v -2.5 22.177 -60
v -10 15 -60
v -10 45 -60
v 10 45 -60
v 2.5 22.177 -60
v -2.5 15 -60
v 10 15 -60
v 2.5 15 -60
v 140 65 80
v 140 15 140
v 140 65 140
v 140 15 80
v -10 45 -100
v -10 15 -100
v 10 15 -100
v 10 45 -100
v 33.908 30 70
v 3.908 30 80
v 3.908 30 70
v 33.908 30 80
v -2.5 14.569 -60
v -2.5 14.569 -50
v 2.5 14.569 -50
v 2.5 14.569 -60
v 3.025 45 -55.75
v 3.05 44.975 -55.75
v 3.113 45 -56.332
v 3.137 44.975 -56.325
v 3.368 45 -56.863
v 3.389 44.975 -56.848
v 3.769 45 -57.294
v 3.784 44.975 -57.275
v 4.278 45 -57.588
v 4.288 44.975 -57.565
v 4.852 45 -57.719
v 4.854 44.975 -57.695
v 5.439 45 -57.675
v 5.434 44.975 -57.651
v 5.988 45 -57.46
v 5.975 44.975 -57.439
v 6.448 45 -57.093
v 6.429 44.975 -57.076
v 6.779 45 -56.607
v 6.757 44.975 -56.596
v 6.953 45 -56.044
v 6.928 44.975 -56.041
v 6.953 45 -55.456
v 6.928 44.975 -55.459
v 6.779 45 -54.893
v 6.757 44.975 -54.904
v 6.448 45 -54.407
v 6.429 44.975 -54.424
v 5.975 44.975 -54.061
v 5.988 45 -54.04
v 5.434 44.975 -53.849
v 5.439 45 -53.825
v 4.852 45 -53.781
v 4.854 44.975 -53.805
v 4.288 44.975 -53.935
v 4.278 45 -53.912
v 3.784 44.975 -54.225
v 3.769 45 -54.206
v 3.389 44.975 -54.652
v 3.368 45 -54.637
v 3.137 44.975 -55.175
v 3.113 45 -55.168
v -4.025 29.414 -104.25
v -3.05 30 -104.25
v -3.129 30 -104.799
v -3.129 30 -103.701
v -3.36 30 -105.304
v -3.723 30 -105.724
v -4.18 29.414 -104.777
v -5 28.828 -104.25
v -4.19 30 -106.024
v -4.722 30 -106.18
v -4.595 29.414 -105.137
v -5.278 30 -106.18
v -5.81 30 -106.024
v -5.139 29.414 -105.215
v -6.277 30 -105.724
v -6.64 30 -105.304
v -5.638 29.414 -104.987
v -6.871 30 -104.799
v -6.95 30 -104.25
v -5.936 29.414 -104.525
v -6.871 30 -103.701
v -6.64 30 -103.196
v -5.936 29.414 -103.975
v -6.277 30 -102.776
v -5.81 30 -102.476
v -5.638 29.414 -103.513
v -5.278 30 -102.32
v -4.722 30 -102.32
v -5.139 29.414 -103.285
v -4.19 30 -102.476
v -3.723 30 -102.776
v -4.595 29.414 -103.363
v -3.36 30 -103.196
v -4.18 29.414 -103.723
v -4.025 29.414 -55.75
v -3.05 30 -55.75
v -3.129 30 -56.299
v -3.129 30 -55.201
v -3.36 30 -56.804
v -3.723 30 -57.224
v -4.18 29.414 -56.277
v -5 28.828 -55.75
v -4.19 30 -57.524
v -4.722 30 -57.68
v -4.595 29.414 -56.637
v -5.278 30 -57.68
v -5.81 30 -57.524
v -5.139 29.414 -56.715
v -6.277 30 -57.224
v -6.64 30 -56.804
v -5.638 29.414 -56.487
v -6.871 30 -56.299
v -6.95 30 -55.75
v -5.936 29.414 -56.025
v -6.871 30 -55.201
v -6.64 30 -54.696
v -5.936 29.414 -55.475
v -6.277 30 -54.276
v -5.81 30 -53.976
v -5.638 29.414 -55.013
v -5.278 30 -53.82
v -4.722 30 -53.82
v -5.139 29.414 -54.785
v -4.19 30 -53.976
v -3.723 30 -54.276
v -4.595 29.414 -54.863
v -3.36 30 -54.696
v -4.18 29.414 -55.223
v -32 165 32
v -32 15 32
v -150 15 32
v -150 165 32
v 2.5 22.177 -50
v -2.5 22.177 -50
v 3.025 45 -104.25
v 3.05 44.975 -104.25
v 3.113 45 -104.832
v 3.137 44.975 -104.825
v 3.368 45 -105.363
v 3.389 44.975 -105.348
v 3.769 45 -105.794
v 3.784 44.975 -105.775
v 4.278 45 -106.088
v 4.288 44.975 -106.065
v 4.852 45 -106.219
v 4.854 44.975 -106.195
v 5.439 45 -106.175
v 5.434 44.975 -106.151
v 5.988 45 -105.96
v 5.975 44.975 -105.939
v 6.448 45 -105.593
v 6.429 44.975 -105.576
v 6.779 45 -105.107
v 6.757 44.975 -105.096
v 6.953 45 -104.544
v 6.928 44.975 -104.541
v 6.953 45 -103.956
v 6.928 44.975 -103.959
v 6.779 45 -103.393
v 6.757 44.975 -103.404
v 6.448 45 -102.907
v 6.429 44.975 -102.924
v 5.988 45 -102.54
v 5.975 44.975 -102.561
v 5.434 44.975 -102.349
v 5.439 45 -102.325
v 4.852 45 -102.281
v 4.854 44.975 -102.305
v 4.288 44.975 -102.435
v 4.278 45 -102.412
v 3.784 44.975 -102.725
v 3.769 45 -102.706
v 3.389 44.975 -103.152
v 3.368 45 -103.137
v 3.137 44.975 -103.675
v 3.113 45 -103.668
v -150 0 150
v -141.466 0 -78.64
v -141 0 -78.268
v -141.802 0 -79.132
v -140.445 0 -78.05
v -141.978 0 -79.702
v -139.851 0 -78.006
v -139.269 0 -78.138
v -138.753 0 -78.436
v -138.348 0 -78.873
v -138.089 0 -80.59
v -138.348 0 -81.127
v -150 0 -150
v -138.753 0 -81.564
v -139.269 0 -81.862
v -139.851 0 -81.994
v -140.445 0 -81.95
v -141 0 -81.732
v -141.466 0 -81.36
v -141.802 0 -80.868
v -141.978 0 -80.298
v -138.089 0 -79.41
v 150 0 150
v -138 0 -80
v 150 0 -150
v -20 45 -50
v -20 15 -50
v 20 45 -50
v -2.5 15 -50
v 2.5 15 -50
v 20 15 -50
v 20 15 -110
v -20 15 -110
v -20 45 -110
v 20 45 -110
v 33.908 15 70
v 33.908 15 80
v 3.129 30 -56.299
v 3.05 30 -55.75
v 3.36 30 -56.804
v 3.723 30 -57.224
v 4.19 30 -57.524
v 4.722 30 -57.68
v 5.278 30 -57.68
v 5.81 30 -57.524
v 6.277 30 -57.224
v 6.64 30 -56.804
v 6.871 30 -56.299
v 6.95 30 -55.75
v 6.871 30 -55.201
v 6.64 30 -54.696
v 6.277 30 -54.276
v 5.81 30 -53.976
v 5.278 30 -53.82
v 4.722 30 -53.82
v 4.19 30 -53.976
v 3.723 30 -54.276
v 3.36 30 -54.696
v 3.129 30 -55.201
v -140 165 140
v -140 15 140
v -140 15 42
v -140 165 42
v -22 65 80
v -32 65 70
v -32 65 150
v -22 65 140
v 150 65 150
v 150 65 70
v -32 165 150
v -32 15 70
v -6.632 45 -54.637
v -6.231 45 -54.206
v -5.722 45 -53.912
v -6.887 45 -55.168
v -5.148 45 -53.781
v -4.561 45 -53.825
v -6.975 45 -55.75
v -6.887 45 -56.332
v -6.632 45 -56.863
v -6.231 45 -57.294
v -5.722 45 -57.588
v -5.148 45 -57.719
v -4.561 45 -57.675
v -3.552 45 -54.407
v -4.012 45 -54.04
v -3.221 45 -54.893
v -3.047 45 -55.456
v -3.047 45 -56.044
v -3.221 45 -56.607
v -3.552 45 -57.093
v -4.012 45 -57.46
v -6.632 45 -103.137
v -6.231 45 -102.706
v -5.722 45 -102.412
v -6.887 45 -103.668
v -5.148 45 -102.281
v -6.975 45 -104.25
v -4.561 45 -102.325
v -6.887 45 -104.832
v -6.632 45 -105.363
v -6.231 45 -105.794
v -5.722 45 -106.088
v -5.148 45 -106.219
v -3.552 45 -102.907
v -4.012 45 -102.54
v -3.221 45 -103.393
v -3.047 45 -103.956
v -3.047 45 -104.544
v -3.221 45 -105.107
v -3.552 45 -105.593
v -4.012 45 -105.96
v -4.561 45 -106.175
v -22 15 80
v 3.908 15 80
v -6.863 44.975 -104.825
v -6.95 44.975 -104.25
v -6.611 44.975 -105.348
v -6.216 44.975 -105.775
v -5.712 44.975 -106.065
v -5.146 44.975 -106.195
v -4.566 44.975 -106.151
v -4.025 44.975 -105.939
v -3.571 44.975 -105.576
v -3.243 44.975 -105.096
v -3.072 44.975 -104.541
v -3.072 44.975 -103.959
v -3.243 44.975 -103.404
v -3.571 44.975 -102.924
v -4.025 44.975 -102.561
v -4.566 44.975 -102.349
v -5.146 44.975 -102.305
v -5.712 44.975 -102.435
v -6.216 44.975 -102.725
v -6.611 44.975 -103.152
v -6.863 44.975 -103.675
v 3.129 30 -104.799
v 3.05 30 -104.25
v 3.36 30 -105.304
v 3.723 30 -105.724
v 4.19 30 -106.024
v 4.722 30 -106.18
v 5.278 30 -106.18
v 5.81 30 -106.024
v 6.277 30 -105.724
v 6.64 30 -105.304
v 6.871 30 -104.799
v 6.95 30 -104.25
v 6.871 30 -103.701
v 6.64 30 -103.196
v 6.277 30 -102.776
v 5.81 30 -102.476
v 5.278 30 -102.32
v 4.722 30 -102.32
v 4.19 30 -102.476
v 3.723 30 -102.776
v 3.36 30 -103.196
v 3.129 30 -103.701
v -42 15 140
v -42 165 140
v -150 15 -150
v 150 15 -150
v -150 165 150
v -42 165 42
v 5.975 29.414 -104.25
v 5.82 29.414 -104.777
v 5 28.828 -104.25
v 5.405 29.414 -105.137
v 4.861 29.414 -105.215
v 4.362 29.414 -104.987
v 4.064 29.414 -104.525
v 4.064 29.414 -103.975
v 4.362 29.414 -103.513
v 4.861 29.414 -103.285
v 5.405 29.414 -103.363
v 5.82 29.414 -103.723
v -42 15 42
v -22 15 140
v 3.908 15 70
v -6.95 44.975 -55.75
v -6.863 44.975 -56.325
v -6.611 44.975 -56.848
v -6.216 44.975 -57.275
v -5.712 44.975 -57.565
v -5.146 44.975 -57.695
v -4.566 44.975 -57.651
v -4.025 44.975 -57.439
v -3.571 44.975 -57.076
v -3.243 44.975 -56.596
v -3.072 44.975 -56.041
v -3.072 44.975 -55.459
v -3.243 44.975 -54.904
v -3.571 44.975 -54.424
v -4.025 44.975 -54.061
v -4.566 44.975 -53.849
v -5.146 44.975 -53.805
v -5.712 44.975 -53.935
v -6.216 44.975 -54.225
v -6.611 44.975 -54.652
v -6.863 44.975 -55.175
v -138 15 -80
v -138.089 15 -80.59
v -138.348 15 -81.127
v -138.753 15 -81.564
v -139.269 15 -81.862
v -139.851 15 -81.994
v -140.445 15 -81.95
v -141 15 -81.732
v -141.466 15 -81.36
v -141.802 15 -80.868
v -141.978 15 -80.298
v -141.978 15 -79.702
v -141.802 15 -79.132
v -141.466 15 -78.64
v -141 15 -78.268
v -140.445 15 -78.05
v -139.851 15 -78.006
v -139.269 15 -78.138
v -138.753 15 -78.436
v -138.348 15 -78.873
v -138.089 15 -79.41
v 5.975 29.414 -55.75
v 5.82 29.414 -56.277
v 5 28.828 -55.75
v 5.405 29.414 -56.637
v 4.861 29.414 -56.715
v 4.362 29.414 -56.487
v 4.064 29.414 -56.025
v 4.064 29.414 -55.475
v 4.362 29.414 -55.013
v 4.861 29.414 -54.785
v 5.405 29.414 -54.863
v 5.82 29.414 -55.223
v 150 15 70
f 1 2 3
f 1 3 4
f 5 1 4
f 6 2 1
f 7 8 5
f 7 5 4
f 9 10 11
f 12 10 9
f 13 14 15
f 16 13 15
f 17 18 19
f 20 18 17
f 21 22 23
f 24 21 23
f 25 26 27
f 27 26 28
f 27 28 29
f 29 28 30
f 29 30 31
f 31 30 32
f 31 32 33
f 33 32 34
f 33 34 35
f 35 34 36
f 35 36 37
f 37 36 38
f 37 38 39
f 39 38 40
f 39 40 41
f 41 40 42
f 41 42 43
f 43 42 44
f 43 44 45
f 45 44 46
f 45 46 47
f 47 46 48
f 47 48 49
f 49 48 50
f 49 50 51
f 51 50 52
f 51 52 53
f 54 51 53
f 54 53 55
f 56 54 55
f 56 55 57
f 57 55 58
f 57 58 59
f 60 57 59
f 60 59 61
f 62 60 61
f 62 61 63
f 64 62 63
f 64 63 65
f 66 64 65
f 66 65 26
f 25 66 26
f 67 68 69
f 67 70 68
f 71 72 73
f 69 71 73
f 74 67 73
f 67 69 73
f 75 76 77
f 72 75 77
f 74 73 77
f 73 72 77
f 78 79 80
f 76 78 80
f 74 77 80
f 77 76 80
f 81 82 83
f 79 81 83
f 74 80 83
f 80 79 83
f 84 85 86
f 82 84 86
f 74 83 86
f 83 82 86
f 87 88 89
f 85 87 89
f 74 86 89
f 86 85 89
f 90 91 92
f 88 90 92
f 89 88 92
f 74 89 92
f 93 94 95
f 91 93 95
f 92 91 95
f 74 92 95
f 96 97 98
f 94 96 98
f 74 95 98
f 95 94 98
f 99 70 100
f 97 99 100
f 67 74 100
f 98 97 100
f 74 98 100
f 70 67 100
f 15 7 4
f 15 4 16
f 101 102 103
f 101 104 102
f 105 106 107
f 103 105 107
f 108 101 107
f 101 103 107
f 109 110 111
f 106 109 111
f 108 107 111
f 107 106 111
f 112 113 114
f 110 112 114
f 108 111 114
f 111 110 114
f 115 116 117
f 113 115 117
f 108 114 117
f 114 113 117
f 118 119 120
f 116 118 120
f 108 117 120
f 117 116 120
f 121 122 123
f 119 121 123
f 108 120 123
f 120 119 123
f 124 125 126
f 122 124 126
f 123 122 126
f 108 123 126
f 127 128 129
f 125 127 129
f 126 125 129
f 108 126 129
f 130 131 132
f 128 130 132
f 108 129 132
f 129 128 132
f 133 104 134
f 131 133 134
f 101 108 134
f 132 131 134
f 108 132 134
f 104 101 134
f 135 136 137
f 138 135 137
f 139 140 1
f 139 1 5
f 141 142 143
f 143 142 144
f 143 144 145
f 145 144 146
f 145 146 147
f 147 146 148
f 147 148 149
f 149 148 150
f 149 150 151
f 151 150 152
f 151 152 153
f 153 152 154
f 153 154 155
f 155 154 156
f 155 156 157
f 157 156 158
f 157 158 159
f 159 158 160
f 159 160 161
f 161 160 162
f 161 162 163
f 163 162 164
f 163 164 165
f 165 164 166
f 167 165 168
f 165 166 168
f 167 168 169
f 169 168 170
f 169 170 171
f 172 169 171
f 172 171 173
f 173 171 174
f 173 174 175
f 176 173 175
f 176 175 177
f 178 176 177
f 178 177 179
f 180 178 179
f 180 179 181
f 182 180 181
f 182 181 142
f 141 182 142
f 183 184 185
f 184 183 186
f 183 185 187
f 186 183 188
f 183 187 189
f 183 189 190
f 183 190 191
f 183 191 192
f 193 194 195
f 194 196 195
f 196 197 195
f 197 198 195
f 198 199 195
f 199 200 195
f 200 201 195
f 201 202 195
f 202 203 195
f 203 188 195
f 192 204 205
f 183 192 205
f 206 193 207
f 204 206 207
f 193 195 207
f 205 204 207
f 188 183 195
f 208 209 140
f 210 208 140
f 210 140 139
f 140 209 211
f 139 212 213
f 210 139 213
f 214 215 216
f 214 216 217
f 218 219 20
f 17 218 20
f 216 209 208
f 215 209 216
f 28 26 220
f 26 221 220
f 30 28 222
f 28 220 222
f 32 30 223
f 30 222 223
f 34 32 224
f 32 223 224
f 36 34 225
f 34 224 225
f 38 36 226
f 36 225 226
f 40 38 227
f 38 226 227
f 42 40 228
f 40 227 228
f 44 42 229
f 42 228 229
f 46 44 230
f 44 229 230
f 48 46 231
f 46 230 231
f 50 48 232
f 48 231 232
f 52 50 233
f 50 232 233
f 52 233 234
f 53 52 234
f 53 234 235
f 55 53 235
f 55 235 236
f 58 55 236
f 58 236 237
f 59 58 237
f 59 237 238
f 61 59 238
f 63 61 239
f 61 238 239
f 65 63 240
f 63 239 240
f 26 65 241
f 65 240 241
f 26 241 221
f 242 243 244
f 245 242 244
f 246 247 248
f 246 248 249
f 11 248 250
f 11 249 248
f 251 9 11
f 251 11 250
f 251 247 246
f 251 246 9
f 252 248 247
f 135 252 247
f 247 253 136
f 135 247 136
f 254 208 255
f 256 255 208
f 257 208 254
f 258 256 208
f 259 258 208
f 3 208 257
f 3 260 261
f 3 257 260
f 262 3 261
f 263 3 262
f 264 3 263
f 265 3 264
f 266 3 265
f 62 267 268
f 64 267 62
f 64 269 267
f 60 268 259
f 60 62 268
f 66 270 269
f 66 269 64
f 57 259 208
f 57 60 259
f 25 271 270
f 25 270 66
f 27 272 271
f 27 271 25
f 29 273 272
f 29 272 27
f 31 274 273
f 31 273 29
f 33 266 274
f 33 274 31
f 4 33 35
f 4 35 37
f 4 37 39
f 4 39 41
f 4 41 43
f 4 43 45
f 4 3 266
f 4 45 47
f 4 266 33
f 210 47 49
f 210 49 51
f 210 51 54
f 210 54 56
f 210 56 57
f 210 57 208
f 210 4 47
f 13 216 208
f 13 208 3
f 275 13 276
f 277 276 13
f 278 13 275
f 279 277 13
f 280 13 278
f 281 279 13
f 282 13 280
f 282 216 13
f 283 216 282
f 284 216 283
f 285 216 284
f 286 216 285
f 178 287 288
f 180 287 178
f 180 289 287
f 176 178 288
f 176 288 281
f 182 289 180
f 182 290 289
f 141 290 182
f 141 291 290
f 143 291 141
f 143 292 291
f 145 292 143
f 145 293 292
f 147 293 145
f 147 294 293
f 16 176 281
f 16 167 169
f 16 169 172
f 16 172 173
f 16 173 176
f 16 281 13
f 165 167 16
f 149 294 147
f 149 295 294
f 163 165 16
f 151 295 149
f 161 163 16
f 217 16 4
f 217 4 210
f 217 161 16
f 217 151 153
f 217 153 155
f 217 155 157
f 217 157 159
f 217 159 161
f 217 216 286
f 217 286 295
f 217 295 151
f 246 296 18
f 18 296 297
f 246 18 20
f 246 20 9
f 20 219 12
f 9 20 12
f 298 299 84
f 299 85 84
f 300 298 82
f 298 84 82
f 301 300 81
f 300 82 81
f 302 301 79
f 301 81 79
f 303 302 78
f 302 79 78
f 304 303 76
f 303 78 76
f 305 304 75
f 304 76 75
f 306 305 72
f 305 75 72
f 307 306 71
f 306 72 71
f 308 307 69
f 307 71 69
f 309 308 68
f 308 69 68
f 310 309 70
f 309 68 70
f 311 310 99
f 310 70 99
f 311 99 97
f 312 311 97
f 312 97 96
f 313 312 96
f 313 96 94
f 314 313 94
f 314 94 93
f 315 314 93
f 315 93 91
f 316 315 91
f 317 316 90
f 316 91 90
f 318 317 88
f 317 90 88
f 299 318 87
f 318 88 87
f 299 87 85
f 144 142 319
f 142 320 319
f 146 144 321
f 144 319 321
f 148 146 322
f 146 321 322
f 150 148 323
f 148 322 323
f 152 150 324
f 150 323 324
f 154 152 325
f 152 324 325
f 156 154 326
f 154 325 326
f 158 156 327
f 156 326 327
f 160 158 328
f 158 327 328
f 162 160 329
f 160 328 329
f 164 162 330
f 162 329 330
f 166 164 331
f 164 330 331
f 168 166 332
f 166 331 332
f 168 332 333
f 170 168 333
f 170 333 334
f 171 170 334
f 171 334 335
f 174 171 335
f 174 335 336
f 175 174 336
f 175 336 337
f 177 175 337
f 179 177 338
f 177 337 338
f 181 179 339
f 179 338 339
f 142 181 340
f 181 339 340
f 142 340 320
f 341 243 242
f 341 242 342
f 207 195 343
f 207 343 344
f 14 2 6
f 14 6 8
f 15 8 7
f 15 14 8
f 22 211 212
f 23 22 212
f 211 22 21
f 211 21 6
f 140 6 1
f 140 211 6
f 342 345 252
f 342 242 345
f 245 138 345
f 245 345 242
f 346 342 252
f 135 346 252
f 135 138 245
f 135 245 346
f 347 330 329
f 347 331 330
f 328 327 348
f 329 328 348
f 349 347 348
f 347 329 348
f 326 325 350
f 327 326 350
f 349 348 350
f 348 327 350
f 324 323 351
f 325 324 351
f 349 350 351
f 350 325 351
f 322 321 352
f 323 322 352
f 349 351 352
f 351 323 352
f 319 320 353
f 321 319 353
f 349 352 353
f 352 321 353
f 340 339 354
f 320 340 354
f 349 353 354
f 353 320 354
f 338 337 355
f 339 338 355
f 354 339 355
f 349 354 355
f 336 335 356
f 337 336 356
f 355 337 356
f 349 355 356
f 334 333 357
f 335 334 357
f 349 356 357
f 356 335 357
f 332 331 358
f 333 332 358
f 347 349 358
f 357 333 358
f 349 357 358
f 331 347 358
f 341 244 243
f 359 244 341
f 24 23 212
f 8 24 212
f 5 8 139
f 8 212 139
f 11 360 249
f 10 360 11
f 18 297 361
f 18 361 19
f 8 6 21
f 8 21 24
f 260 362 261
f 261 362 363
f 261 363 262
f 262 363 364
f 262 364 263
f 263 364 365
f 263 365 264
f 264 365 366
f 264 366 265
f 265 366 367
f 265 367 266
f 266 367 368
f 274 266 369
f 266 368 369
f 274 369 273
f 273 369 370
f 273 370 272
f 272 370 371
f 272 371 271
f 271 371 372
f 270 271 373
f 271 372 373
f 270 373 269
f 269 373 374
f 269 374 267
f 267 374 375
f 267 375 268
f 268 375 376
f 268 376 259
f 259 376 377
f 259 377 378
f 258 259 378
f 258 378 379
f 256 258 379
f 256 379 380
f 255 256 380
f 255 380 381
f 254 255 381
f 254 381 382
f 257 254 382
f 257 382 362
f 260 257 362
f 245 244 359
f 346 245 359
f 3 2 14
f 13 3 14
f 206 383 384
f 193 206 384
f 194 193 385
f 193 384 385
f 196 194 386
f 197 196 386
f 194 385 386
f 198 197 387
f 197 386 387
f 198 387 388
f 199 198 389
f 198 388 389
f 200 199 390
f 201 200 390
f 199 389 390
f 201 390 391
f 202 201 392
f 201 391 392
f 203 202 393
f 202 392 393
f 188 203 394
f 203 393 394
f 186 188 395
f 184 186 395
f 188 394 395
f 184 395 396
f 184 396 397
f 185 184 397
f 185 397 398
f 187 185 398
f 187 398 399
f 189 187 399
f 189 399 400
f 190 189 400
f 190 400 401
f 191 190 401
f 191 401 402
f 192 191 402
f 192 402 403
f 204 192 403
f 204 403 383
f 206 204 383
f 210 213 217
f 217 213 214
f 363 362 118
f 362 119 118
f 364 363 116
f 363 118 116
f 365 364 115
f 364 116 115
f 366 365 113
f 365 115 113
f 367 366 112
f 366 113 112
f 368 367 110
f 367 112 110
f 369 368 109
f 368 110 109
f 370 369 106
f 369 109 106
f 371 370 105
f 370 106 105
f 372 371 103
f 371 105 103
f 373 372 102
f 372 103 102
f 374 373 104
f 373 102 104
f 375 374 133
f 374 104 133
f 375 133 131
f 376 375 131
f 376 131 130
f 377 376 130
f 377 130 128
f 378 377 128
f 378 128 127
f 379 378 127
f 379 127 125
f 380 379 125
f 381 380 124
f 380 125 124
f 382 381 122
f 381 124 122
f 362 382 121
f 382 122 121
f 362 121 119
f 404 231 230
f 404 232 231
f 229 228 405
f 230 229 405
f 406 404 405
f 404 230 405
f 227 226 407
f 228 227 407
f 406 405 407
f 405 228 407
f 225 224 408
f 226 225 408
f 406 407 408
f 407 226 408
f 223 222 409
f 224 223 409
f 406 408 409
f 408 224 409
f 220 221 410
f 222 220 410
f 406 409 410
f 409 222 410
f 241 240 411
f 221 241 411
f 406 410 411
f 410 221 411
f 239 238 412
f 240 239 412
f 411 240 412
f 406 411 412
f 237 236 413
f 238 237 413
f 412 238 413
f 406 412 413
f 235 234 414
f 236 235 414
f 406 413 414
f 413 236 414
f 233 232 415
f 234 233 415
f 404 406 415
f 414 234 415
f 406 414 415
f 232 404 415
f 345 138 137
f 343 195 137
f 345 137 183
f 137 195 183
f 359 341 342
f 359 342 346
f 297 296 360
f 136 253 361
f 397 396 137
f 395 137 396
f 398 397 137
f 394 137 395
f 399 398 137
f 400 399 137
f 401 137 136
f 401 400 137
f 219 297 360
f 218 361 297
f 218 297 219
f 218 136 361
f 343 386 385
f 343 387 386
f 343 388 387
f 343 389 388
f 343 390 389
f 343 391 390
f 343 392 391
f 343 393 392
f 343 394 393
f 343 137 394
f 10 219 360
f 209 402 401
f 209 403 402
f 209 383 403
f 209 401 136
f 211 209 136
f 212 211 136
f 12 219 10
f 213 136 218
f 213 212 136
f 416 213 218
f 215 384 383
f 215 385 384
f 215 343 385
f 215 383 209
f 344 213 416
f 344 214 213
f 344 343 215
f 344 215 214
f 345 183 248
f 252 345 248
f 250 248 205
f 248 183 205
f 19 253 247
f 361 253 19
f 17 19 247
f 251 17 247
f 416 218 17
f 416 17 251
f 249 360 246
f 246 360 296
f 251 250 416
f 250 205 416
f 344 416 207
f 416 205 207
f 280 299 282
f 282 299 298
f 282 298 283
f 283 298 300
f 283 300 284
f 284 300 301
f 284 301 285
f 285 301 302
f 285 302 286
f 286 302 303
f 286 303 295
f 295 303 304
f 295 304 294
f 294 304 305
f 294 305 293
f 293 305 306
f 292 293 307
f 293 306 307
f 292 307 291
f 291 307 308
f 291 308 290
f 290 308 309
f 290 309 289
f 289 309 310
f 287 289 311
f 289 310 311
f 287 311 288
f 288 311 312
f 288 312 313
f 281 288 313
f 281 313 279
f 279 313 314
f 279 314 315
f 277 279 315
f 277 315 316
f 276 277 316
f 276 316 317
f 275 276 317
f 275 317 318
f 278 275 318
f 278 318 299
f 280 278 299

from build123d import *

# Parameters (mm, degrees)
CROQUIS1_W                               = 300
CROQUIS1_H                               = 300
SALIENTE_EXTRUIR1_DEPTH                  = 15
CROQUIS2_W                               = 98
CROQUIS2_H                               = 98
SALIENTE_EXTRUIR2_DEPTH                  = 150
CROQUIS3_W                               = 40
CROQUIS3_H                               = 60
CROQUIS3_W_2                             = 20
CROQUIS3_H_2                             = 40
SALIENTE_EXTRUIR3_DEPTH                  = 30
CROQUIS4_W                               = 182
CROQUIS4_H                               = 80
CROQUIS4_W_2                             = 162
CROQUIS4_H_2                             = 60
SALIENTE_EXTRUIR4_DEPTH                  = 50
TALADRO_DE_MARGEN_PARA_M3_51_D           = 3.9
TALADRO_DE_MARGEN_PARA_M3_51_DEPTH       = 15
TALADRO_DE_MARGEN_PARA_M3_51_CSINK_D     = 3.95
TALADRO_DE_MARGEN_PARA_M3_51_CSINK_ANGLE = 90
TALADRO_DE_MARGEN_PARA_M3_51_TIP         = 1.171678207
CROQUIS7_W                               = 5
CROQUIS7_H                               = 7.608570781
CORTAR_EXTRUIR1_DEPTH                    = 10
CROQUIS8_W                               = 30
CROQUIS8_H                               = 15
CORTAR_EXTRUIR2_DEPTH                    = 10
CROQUIS9_R                               = 2
CORTAR_EXTRUIR3_DEPTH                    = 20


with BuildPart() as part:
    # Croquis1 → Saliente-Extruir1 (new body)
    with BuildSketch(Plane(origin=(0, 0, 0), x_dir=(1, 0, 0), z_dir=(0, 1, 0))):
        Rectangle(CROQUIS1_W, CROQUIS1_H)
    extrude(amount=SALIENTE_EXTRUIR1_DEPTH)

    # Croquis2 → Saliente-Extruir2 (add)
    with BuildSketch(Plane(origin=(0, 15, 0), x_dir=(1, 0, 0), z_dir=(0, 1, 0))):
        Polygon((-150, -140), (-150, -150), (-32, -150), (-32, -55), (-32, -32), (-150, -32), (-150, -55), align=None)
        with Locations((-91, -91)):
            Rectangle(CROQUIS2_W, CROQUIS2_H, mode=Mode.SUBTRACT)
    extrude(amount=SALIENTE_EXTRUIR2_DEPTH)

    # Croquis3 → Saliente-Extruir3 (add)
    with BuildSketch(Plane(origin=(0, 15, 0), x_dir=(1, 0, 0), z_dir=(0, 1, 0))):
        with Locations((0, 80)):
            Rectangle(CROQUIS3_W, CROQUIS3_H)
        with Locations((0, 80)):
            Rectangle(CROQUIS3_W_2, CROQUIS3_H_2, mode=Mode.SUBTRACT)
    extrude(amount=SALIENTE_EXTRUIR3_DEPTH)

    # Croquis4 → Saliente-Extruir4 (add)
    with BuildSketch(Plane(origin=(0, 15, 0), x_dir=(1, 0, 0), z_dir=(0, 1, 0))):
        with Locations((59, -110)):
            Rectangle(CROQUIS4_W, CROQUIS4_H)
        with Locations((59, -110)):
            Rectangle(CROQUIS4_W_2, CROQUIS4_H_2, mode=Mode.SUBTRACT)
    extrude(amount=SALIENTE_EXTRUIR4_DEPTH)

    # Taladro de margen para M3.51
    with Locations(Plane(origin=(0, 45, 0), x_dir=(1, 0, 0), z_dir=(0, 1, 0))):
        with Locations((-5, 104.25), (5, 104.25), (-5, 55.75), (5, 55.75)):
            CounterSinkHole(TALADRO_DE_MARGEN_PARA_M3_51_D / 2, TALADRO_DE_MARGEN_PARA_M3_51_CSINK_D / 2, depth=TALADRO_DE_MARGEN_PARA_M3_51_DEPTH, counter_sink_angle=TALADRO_DE_MARGEN_PARA_M3_51_CSINK_ANGLE)
            with Locations((0, 0, -(TALADRO_DE_MARGEN_PARA_M3_51_DEPTH + TALADRO_DE_MARGEN_PARA_M3_51_TIP / 2))):  # 118° drill point
                Cone(0, TALADRO_DE_MARGEN_PARA_M3_51_D / 2, TALADRO_DE_MARGEN_PARA_M3_51_TIP, mode=Mode.SUBTRACT)

    # Croquis7 → Cortar-Extruir1 (cut)
    with BuildSketch(Plane.XY.offset(-50)):
        with Locations((0, 18.373101355)):
            Rectangle(CROQUIS7_W, CROQUIS7_H)
    extrude(amount=-CORTAR_EXTRUIR1_DEPTH, mode=Mode.SUBTRACT)

    # Croquis8 → Cortar-Extruir2 (cut)
    with BuildSketch(Plane.XY.offset(80)):
        with Locations((18.908102742, 22.5)):
            Rectangle(CROQUIS8_W, CROQUIS8_H)
    extrude(amount=-CORTAR_EXTRUIR2_DEPTH, mode=Mode.SUBTRACT)

    # Croquis9 → Cortar-Extruir3 (cut)
    with BuildSketch(Plane(origin=(0, 15, 0), x_dir=(1, 0, 0), z_dir=(0, 1, 0))):
        with Locations((-140, 80)):
            Circle(CROQUIS9_R)
    extrude(amount=-CORTAR_EXTRUIR3_DEPTH, mode=Mode.SUBTRACT)


solid = part.part
